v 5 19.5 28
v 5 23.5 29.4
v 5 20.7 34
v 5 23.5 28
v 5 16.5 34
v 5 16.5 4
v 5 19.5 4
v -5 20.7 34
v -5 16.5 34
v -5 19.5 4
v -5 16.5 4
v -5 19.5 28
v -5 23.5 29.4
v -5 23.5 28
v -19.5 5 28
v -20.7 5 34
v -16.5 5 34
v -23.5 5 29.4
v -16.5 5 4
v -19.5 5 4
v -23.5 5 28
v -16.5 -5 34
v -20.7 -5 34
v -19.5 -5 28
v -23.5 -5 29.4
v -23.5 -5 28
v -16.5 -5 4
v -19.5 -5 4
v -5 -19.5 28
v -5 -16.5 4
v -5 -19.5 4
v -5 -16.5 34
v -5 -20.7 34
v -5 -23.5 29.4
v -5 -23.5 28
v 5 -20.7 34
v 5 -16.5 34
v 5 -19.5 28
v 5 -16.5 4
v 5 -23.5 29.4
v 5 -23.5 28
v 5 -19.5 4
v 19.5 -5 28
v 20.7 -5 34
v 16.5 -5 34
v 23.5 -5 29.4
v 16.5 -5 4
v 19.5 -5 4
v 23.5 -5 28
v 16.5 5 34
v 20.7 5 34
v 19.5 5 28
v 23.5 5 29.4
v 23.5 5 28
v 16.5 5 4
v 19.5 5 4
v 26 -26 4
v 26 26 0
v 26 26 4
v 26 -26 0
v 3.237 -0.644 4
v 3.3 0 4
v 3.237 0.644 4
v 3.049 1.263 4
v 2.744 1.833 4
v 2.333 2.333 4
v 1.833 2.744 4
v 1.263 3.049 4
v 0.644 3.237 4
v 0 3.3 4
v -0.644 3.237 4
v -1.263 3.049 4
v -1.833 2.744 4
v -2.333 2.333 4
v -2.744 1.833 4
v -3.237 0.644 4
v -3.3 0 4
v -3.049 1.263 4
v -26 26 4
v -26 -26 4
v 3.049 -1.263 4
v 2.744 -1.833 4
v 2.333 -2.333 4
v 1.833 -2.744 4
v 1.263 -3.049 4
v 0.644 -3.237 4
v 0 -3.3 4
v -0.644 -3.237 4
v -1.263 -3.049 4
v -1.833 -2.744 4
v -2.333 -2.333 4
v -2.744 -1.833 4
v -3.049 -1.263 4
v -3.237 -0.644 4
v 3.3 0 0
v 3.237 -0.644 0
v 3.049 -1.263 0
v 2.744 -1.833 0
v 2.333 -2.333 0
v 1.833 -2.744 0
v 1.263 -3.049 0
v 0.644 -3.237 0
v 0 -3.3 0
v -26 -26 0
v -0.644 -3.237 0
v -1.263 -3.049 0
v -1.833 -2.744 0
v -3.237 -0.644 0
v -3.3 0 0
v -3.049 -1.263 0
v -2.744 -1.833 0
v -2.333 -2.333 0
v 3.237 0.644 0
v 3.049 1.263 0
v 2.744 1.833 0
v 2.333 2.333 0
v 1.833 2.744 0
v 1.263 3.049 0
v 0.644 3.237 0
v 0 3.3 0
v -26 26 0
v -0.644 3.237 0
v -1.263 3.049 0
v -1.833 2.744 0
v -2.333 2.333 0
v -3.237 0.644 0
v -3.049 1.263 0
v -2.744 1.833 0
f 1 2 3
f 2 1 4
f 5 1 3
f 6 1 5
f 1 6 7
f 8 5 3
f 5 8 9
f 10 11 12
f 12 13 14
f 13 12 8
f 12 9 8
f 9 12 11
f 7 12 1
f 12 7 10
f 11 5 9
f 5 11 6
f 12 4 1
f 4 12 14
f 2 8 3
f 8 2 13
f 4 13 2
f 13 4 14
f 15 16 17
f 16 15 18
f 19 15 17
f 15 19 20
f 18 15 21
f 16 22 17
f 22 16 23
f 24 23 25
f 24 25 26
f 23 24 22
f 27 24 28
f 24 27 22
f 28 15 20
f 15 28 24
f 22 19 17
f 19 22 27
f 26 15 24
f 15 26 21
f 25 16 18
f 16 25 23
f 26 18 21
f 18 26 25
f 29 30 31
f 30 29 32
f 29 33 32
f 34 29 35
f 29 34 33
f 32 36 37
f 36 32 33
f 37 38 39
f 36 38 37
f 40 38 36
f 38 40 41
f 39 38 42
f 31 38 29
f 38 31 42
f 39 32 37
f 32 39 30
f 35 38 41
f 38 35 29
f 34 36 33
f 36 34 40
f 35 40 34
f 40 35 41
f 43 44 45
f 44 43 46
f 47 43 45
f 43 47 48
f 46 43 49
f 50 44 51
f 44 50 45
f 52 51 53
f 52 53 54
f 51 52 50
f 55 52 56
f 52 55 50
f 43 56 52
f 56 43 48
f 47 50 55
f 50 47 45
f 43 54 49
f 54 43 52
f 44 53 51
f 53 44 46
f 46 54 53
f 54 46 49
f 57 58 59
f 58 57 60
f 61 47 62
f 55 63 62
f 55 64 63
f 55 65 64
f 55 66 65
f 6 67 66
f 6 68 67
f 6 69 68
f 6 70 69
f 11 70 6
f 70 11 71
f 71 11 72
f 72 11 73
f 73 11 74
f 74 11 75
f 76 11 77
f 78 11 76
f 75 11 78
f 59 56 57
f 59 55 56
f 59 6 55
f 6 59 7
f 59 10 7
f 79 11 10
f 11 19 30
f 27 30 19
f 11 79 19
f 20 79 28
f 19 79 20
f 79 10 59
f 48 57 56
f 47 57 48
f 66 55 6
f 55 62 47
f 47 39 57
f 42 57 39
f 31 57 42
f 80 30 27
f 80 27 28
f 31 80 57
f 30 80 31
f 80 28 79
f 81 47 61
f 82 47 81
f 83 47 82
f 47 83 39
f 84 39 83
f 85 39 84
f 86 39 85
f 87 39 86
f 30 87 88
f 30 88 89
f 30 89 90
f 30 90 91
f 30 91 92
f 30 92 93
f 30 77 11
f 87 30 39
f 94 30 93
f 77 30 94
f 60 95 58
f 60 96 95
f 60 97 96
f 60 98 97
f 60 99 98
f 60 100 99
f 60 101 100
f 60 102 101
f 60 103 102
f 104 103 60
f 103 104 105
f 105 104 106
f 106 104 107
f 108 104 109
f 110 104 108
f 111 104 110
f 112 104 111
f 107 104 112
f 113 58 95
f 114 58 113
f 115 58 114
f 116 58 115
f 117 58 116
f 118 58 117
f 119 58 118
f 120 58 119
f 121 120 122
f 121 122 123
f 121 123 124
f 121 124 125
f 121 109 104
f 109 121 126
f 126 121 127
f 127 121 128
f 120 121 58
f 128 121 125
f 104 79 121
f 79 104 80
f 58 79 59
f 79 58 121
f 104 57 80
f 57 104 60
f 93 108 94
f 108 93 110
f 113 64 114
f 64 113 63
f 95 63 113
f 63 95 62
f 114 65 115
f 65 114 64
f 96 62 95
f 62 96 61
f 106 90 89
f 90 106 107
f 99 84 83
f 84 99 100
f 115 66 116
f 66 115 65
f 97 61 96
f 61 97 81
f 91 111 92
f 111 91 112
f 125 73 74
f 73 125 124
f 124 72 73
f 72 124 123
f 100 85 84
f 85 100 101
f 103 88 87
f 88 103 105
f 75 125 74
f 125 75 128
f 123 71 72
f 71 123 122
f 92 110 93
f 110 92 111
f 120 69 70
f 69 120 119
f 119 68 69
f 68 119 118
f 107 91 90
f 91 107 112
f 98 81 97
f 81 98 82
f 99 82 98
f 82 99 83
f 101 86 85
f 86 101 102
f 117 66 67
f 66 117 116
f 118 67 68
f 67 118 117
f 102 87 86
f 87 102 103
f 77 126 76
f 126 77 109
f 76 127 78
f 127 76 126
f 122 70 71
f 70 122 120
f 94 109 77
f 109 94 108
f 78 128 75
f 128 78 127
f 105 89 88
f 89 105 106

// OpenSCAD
$fn = 32;

// ----------------------------------------------------------------------
// Snap-fit latch: 4 arms, 30 mm tall, 4.2 mm undercut hooks
// ----------------------------------------------------------------------

// --- parameters (mm) ---
base_d = 52;              // base plate depth
base_h = 4;               // base plate thickness
span = 36;                // distance between opposite arms
arm_t = 3;                // arm thickness
arm_d = 10;               // arm width
height = 30;              // free arm length
head_len = 4.2;           // hook reach
head_h = 6;               // hook height
lead = 1.4;               // lead-in ramp thickness
bore_d = 6.6;             // base fixing bore
top_z = 34;               // height of the arm tips above the base

arms = 4;

difference() {
  union() {
    /* base plate, centred on the arm ring */
    translate([-26, -26, 0]) cube([base_d, base_d, base_h]);
    for (a = [0 : 360 / arms : 359]) rotate([0, 0, a]) {
    /* arm, sunk 0.5 mm into the base */
    translate([-arm_d / 2, span / 2 - arm_t / 2, base_h - 0.5]) cube([arm_d, arm_t, height + 0.5]);
    /* hook: a convex hull of a tall inner block and a thin outer lip
       gives a flat undercut below and a lead-in ramp on top */
    hull() {
      translate([-arm_d / 2, span / 2 + arm_t / 2 - 0.6, top_z - head_h]) cube([arm_d, lead + 0.4, head_h]);
      translate([-arm_d / 2, span / 2 + arm_t / 2 - 0.2, top_z - head_h]) cube([arm_d, head_len, lead]);
    }
    }
  }
  translate([0, 0, -2.5]) cylinder(h = base_h + 5, d = bore_d);
}
